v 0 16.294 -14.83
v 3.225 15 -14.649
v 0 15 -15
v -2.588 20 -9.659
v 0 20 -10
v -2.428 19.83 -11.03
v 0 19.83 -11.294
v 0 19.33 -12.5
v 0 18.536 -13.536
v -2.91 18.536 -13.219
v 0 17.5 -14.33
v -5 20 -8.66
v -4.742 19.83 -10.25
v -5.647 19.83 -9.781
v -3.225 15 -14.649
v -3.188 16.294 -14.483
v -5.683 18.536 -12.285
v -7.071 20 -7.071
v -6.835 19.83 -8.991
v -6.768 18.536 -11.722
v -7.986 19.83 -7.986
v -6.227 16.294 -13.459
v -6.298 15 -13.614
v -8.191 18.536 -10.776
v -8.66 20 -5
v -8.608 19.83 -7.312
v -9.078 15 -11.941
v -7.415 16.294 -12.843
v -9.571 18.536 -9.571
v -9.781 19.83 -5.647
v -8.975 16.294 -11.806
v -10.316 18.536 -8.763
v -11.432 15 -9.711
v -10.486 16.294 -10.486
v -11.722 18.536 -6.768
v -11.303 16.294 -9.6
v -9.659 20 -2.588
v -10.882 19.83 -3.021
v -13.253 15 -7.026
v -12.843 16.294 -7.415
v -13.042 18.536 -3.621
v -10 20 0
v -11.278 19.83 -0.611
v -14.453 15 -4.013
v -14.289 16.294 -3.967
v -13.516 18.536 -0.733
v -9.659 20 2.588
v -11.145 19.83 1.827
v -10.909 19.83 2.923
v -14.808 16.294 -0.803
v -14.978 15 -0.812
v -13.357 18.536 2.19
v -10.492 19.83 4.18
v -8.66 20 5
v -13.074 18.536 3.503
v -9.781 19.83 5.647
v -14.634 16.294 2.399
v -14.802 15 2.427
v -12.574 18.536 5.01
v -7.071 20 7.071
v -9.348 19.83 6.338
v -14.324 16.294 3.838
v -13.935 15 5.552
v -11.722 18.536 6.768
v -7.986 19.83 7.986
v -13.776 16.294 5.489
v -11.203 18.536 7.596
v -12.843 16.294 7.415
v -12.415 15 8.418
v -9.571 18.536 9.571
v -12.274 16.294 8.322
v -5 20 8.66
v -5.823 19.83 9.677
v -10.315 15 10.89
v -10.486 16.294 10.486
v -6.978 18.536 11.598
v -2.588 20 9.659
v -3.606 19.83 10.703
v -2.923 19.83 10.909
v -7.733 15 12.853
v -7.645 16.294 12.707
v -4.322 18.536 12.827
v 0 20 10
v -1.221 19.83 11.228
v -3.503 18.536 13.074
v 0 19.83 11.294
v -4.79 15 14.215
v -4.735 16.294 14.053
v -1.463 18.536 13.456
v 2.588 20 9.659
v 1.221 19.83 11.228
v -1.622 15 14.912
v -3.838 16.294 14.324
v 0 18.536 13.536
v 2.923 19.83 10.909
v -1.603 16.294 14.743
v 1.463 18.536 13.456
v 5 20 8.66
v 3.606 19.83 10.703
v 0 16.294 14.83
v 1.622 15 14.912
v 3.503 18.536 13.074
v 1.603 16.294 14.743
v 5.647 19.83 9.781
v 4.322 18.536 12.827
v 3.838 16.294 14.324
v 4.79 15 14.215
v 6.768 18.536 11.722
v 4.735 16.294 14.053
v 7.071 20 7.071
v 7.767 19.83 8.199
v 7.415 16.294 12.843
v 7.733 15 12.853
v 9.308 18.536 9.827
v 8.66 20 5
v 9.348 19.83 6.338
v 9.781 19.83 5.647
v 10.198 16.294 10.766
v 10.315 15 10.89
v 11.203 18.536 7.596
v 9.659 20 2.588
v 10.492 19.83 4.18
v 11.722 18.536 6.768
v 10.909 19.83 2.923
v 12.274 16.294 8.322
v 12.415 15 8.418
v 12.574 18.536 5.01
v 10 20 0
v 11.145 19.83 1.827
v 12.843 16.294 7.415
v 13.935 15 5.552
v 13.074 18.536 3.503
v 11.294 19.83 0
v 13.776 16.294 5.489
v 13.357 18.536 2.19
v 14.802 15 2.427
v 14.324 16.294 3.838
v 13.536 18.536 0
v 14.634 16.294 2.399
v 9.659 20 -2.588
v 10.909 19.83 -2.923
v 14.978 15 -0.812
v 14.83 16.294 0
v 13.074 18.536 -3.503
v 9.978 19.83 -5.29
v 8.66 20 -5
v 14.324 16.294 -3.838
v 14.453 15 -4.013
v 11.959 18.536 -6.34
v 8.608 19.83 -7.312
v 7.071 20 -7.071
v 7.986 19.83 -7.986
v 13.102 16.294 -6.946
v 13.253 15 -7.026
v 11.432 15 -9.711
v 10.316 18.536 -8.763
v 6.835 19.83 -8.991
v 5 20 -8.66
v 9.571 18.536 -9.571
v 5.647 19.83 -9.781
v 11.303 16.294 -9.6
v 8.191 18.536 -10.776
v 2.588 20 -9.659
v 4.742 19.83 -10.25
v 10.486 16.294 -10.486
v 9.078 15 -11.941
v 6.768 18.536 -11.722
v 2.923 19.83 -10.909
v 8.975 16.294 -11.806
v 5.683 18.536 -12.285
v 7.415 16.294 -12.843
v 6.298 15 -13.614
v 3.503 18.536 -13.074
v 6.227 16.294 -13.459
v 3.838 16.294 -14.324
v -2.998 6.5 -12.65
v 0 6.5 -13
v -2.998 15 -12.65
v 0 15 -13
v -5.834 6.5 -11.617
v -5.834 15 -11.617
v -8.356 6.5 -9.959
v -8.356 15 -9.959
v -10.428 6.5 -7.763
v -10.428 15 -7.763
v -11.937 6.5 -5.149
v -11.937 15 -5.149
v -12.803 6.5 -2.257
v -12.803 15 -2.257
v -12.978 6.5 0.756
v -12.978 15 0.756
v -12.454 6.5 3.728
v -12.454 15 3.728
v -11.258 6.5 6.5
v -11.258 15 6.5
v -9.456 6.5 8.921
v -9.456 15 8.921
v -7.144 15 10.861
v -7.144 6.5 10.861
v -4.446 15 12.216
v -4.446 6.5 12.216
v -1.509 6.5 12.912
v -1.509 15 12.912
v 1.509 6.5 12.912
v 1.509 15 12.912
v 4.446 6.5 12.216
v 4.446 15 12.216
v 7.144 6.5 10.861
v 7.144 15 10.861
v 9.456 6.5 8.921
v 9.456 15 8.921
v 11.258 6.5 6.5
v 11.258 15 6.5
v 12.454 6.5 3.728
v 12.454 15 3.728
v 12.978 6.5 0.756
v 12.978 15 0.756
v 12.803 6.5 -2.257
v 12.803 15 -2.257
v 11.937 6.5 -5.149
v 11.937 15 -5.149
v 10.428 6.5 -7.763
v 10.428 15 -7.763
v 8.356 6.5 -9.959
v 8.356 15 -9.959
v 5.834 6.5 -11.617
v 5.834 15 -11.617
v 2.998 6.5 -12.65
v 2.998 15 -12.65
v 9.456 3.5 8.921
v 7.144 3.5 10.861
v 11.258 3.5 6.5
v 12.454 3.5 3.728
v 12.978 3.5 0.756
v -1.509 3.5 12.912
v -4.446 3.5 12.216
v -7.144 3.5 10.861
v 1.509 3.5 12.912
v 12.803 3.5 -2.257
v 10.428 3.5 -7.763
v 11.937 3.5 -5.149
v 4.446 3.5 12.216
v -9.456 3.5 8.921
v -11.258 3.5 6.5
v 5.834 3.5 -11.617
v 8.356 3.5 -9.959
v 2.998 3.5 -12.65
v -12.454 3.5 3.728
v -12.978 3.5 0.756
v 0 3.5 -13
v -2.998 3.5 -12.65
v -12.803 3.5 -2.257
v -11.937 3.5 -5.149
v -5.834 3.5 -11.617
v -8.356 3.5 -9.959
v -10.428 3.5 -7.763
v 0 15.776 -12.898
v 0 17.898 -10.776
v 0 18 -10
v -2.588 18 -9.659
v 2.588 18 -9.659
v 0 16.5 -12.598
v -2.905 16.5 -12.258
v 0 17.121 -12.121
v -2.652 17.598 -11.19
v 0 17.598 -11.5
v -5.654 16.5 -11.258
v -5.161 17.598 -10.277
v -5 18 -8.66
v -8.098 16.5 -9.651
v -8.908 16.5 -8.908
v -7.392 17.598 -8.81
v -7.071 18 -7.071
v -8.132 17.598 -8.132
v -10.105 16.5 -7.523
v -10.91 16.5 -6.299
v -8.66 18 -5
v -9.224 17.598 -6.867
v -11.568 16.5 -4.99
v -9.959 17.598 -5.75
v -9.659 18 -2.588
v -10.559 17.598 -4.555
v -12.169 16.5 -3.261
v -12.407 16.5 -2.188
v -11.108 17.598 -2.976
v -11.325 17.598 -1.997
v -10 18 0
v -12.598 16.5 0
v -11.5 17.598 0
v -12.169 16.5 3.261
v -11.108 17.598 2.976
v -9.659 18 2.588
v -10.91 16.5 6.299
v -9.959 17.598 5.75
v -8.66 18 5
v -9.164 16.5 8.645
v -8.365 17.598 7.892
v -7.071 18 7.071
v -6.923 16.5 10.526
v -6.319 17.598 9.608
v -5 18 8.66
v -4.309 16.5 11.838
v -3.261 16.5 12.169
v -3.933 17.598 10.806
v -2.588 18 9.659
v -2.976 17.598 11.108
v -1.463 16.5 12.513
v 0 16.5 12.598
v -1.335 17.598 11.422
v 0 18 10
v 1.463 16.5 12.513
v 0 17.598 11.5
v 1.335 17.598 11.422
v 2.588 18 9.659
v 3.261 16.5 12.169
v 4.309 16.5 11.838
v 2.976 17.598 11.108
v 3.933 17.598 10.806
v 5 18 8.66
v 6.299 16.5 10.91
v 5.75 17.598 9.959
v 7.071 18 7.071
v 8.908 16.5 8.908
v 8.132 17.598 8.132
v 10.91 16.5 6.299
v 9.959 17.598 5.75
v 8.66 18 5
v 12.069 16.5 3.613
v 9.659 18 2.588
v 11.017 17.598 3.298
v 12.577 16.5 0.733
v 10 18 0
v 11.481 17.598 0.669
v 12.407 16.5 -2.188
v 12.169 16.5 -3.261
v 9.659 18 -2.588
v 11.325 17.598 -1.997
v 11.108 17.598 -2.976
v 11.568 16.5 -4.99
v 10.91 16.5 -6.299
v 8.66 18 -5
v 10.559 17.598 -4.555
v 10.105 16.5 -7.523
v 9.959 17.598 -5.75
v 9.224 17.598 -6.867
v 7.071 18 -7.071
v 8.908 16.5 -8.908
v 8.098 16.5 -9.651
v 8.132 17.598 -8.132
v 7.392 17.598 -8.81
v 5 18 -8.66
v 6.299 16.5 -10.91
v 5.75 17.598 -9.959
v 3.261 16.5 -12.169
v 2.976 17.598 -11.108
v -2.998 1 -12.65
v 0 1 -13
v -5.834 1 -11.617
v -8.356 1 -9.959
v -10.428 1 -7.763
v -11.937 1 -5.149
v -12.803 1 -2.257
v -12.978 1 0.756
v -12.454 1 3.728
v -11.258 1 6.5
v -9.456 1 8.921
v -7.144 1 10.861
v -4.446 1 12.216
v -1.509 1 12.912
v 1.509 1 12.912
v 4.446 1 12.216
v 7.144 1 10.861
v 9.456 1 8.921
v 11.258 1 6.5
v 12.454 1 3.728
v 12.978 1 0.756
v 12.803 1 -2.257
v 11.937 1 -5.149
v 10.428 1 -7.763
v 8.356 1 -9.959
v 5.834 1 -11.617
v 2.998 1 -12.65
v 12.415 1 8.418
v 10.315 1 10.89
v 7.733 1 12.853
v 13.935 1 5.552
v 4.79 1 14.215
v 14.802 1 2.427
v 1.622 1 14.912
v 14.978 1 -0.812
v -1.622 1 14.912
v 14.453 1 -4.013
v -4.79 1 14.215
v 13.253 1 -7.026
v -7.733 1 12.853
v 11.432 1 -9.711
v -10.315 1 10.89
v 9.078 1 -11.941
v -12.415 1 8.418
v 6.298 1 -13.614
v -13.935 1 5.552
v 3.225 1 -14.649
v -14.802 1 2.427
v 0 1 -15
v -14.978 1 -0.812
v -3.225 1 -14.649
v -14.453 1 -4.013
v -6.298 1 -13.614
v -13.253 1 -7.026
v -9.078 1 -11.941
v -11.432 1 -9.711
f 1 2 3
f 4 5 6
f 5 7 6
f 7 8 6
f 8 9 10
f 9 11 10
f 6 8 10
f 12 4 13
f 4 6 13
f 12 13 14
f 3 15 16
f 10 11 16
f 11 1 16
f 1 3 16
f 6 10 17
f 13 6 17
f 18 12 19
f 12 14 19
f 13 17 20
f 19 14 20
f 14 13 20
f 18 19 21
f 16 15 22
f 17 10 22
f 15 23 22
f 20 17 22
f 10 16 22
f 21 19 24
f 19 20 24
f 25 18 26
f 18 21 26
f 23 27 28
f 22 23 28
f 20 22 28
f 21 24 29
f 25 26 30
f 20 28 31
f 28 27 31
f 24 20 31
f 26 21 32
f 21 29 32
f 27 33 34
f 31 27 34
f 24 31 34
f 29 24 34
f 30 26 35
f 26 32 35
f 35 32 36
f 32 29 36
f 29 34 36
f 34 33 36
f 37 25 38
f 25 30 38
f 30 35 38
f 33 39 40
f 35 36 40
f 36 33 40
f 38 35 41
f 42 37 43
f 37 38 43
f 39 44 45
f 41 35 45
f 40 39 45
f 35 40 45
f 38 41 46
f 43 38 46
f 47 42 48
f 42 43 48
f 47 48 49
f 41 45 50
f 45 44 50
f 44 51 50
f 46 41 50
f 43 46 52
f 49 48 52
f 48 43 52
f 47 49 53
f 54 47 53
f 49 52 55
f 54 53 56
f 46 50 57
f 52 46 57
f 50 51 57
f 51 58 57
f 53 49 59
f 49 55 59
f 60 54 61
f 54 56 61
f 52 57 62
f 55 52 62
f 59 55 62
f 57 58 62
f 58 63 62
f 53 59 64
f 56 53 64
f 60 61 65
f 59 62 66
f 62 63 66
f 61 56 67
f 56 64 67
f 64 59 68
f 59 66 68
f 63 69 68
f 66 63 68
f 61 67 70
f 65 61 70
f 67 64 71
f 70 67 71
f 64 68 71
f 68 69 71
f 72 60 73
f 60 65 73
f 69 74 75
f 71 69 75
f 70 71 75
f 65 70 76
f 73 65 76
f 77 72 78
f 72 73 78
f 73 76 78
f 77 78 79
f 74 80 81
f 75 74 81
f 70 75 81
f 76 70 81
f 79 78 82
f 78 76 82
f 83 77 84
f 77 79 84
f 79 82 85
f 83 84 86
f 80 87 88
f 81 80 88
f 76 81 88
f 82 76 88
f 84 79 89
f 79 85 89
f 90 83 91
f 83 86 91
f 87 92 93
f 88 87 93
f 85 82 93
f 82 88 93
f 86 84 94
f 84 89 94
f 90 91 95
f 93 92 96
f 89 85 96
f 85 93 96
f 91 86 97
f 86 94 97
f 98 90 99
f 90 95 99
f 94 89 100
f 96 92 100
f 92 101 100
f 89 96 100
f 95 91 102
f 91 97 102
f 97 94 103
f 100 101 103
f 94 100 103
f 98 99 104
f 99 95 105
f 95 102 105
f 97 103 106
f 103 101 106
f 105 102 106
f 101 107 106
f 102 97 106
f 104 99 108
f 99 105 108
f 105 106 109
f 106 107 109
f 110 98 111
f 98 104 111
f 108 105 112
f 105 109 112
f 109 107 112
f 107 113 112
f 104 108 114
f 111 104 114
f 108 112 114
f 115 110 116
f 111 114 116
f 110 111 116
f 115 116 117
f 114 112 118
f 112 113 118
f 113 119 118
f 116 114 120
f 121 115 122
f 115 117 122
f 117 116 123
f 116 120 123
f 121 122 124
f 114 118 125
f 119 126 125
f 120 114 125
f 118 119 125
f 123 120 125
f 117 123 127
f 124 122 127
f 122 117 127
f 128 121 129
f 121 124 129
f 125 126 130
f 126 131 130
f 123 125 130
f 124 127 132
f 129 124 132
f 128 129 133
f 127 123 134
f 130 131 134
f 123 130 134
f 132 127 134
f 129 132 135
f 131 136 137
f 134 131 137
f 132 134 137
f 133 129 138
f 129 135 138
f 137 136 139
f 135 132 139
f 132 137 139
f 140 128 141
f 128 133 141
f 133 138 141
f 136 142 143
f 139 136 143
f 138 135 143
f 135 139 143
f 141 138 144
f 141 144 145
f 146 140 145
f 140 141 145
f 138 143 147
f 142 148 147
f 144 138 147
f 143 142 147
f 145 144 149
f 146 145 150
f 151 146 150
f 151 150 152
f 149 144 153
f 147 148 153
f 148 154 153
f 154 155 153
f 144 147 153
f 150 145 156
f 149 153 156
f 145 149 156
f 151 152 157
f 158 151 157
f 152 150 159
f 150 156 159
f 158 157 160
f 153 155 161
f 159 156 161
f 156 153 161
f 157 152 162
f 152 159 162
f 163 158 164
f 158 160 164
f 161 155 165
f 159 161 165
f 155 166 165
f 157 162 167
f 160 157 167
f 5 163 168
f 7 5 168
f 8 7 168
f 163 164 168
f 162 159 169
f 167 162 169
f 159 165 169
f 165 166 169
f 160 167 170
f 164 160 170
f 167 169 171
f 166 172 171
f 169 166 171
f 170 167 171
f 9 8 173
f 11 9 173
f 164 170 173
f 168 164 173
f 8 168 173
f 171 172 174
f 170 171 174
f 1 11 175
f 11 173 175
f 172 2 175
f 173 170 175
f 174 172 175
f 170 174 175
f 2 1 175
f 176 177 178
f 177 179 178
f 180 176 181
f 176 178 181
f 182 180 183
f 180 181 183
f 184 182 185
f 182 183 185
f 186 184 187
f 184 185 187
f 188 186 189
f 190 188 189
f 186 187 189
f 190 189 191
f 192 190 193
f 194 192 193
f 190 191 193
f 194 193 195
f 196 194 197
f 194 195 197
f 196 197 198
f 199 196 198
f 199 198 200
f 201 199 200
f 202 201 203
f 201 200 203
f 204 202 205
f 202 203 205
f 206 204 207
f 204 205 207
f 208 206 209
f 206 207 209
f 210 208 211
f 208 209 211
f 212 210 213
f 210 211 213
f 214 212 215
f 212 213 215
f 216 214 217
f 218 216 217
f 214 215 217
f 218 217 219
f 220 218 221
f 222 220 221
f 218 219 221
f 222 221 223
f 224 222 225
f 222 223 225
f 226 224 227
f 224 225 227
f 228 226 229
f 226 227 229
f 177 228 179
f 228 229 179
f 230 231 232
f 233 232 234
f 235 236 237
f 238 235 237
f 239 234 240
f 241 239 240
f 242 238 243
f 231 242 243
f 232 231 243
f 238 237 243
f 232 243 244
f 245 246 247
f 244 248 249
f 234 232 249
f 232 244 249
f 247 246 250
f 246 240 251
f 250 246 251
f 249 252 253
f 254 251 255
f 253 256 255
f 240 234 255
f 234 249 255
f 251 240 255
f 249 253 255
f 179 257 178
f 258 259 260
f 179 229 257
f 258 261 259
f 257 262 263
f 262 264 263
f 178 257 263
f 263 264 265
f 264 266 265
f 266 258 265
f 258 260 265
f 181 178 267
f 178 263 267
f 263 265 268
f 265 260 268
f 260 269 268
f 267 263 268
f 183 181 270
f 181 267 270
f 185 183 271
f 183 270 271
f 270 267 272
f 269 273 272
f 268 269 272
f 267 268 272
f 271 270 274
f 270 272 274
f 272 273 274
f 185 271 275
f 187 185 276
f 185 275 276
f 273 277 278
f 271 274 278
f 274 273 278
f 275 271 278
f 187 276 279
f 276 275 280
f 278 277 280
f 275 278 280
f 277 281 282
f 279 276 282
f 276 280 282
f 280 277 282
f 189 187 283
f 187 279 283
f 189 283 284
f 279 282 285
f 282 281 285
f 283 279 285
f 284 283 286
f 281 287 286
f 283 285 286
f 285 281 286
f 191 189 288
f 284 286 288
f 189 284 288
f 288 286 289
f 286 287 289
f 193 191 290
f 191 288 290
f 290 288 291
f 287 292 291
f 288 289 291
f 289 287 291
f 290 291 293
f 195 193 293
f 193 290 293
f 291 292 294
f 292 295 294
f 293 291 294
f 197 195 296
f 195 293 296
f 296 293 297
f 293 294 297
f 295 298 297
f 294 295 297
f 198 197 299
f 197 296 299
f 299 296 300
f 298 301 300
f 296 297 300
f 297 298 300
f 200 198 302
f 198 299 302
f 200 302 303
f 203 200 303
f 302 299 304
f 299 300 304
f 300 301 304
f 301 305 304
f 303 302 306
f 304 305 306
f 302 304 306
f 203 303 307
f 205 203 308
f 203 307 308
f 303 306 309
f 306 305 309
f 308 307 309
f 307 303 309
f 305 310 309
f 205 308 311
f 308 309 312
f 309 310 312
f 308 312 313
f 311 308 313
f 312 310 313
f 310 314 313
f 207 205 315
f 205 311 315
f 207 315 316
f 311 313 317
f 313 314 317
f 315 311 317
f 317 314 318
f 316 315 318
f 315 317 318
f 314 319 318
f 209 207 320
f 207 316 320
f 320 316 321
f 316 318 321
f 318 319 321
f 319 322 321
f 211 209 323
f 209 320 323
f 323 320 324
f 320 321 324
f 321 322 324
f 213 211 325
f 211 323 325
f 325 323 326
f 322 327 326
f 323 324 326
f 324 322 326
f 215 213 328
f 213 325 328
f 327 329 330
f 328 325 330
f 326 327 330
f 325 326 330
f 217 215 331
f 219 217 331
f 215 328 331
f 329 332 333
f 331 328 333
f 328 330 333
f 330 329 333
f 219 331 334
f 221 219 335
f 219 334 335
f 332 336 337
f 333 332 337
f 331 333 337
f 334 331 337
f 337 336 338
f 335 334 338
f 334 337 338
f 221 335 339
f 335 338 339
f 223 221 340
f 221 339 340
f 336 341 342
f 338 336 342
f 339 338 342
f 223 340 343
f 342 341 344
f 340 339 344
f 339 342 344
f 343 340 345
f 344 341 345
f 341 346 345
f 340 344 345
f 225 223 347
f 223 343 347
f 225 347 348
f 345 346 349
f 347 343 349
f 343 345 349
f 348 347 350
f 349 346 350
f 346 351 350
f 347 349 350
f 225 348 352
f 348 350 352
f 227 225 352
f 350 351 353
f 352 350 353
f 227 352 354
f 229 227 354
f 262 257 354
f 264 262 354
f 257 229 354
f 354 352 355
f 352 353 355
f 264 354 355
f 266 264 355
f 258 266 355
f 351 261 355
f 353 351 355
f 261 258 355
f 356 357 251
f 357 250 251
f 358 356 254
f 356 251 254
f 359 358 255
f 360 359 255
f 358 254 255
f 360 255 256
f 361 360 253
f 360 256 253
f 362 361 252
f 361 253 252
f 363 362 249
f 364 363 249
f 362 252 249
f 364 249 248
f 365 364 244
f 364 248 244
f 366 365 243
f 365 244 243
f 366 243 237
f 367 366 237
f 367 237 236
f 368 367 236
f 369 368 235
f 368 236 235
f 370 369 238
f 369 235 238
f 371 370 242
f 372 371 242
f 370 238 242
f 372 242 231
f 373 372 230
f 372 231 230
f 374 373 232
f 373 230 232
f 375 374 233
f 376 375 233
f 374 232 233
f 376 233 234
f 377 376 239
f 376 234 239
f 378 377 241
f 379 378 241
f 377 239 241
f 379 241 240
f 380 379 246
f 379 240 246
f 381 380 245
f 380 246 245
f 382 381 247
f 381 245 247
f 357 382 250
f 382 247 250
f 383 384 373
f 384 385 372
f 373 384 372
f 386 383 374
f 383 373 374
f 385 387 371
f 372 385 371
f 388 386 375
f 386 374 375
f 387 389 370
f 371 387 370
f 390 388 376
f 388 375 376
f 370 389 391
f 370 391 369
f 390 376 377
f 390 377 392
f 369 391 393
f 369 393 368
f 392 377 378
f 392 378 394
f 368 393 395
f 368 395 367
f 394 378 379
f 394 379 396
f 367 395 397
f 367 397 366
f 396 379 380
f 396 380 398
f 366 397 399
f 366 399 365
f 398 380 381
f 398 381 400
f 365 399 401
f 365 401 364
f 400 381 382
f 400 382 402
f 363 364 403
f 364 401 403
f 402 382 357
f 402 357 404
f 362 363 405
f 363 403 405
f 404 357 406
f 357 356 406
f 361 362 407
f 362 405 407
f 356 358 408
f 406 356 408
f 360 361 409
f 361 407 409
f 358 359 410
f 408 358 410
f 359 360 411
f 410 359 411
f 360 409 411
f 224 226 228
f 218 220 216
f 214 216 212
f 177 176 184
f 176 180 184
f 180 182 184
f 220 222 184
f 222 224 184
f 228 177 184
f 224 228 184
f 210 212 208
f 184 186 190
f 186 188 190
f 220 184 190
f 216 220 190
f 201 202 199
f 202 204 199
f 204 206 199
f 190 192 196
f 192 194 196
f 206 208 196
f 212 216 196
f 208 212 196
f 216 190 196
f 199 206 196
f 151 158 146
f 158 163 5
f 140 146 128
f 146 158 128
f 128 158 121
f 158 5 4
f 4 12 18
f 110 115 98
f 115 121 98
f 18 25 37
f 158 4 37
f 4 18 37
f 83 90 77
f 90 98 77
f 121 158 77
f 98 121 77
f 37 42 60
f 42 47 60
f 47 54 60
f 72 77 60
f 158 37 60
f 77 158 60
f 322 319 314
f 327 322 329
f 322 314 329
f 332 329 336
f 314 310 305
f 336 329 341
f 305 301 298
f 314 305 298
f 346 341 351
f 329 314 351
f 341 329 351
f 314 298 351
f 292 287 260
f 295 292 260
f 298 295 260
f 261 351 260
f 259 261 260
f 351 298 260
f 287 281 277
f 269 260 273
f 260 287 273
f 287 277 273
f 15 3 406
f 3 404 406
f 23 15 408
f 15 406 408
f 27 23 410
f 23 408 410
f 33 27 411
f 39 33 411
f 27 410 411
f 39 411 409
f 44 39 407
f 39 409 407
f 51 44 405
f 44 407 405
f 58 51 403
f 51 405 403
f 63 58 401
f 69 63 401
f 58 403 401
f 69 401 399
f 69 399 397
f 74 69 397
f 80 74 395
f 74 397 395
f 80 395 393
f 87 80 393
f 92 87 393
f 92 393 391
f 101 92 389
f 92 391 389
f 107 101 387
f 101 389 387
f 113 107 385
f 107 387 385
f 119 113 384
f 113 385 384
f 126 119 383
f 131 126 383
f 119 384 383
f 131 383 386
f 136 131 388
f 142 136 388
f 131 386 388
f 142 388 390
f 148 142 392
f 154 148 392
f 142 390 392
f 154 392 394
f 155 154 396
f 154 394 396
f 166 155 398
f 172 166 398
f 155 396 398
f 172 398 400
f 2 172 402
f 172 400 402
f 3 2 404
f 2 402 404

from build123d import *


with BuildPart() as part:
    # ｽｹｯﾁ1 → 回転1 (revolve)
    with BuildSketch(Plane.XY, mode=Mode.PRIVATE) as revolve_1_sk:
        with BuildLine():
            Line((0, 20), (10, 20))
            ThreePointArc((10, 20), (13.535533906, 18.535533906), (15, 15))
            Line((15, 15), (15, 1))
            Line((15, 1), (13, 1))
            Line((13, 1), (13, 3.5))
            Line((13, 3.5), (0, 3.5))
            Line((0, 3.5), (0, 6.5))
            Line((0, 6.5), (13, 6.5))
            Line((13, 6.5), (13, 15))
            ThreePointArc((13, 15), (12.121320344, 17.121320344), (10, 18))
            Line((10, 18), (0, 18))
            Line((0, 18), (0, 20))
        make_face()
    revolve(revolve_1_sk.sketch.rotate(Axis((0, 3.5, 0), (0, 1, 0)), 90), axis=Axis((0, 3.5, 0), (0, 1, 0)))


solid = part.part
